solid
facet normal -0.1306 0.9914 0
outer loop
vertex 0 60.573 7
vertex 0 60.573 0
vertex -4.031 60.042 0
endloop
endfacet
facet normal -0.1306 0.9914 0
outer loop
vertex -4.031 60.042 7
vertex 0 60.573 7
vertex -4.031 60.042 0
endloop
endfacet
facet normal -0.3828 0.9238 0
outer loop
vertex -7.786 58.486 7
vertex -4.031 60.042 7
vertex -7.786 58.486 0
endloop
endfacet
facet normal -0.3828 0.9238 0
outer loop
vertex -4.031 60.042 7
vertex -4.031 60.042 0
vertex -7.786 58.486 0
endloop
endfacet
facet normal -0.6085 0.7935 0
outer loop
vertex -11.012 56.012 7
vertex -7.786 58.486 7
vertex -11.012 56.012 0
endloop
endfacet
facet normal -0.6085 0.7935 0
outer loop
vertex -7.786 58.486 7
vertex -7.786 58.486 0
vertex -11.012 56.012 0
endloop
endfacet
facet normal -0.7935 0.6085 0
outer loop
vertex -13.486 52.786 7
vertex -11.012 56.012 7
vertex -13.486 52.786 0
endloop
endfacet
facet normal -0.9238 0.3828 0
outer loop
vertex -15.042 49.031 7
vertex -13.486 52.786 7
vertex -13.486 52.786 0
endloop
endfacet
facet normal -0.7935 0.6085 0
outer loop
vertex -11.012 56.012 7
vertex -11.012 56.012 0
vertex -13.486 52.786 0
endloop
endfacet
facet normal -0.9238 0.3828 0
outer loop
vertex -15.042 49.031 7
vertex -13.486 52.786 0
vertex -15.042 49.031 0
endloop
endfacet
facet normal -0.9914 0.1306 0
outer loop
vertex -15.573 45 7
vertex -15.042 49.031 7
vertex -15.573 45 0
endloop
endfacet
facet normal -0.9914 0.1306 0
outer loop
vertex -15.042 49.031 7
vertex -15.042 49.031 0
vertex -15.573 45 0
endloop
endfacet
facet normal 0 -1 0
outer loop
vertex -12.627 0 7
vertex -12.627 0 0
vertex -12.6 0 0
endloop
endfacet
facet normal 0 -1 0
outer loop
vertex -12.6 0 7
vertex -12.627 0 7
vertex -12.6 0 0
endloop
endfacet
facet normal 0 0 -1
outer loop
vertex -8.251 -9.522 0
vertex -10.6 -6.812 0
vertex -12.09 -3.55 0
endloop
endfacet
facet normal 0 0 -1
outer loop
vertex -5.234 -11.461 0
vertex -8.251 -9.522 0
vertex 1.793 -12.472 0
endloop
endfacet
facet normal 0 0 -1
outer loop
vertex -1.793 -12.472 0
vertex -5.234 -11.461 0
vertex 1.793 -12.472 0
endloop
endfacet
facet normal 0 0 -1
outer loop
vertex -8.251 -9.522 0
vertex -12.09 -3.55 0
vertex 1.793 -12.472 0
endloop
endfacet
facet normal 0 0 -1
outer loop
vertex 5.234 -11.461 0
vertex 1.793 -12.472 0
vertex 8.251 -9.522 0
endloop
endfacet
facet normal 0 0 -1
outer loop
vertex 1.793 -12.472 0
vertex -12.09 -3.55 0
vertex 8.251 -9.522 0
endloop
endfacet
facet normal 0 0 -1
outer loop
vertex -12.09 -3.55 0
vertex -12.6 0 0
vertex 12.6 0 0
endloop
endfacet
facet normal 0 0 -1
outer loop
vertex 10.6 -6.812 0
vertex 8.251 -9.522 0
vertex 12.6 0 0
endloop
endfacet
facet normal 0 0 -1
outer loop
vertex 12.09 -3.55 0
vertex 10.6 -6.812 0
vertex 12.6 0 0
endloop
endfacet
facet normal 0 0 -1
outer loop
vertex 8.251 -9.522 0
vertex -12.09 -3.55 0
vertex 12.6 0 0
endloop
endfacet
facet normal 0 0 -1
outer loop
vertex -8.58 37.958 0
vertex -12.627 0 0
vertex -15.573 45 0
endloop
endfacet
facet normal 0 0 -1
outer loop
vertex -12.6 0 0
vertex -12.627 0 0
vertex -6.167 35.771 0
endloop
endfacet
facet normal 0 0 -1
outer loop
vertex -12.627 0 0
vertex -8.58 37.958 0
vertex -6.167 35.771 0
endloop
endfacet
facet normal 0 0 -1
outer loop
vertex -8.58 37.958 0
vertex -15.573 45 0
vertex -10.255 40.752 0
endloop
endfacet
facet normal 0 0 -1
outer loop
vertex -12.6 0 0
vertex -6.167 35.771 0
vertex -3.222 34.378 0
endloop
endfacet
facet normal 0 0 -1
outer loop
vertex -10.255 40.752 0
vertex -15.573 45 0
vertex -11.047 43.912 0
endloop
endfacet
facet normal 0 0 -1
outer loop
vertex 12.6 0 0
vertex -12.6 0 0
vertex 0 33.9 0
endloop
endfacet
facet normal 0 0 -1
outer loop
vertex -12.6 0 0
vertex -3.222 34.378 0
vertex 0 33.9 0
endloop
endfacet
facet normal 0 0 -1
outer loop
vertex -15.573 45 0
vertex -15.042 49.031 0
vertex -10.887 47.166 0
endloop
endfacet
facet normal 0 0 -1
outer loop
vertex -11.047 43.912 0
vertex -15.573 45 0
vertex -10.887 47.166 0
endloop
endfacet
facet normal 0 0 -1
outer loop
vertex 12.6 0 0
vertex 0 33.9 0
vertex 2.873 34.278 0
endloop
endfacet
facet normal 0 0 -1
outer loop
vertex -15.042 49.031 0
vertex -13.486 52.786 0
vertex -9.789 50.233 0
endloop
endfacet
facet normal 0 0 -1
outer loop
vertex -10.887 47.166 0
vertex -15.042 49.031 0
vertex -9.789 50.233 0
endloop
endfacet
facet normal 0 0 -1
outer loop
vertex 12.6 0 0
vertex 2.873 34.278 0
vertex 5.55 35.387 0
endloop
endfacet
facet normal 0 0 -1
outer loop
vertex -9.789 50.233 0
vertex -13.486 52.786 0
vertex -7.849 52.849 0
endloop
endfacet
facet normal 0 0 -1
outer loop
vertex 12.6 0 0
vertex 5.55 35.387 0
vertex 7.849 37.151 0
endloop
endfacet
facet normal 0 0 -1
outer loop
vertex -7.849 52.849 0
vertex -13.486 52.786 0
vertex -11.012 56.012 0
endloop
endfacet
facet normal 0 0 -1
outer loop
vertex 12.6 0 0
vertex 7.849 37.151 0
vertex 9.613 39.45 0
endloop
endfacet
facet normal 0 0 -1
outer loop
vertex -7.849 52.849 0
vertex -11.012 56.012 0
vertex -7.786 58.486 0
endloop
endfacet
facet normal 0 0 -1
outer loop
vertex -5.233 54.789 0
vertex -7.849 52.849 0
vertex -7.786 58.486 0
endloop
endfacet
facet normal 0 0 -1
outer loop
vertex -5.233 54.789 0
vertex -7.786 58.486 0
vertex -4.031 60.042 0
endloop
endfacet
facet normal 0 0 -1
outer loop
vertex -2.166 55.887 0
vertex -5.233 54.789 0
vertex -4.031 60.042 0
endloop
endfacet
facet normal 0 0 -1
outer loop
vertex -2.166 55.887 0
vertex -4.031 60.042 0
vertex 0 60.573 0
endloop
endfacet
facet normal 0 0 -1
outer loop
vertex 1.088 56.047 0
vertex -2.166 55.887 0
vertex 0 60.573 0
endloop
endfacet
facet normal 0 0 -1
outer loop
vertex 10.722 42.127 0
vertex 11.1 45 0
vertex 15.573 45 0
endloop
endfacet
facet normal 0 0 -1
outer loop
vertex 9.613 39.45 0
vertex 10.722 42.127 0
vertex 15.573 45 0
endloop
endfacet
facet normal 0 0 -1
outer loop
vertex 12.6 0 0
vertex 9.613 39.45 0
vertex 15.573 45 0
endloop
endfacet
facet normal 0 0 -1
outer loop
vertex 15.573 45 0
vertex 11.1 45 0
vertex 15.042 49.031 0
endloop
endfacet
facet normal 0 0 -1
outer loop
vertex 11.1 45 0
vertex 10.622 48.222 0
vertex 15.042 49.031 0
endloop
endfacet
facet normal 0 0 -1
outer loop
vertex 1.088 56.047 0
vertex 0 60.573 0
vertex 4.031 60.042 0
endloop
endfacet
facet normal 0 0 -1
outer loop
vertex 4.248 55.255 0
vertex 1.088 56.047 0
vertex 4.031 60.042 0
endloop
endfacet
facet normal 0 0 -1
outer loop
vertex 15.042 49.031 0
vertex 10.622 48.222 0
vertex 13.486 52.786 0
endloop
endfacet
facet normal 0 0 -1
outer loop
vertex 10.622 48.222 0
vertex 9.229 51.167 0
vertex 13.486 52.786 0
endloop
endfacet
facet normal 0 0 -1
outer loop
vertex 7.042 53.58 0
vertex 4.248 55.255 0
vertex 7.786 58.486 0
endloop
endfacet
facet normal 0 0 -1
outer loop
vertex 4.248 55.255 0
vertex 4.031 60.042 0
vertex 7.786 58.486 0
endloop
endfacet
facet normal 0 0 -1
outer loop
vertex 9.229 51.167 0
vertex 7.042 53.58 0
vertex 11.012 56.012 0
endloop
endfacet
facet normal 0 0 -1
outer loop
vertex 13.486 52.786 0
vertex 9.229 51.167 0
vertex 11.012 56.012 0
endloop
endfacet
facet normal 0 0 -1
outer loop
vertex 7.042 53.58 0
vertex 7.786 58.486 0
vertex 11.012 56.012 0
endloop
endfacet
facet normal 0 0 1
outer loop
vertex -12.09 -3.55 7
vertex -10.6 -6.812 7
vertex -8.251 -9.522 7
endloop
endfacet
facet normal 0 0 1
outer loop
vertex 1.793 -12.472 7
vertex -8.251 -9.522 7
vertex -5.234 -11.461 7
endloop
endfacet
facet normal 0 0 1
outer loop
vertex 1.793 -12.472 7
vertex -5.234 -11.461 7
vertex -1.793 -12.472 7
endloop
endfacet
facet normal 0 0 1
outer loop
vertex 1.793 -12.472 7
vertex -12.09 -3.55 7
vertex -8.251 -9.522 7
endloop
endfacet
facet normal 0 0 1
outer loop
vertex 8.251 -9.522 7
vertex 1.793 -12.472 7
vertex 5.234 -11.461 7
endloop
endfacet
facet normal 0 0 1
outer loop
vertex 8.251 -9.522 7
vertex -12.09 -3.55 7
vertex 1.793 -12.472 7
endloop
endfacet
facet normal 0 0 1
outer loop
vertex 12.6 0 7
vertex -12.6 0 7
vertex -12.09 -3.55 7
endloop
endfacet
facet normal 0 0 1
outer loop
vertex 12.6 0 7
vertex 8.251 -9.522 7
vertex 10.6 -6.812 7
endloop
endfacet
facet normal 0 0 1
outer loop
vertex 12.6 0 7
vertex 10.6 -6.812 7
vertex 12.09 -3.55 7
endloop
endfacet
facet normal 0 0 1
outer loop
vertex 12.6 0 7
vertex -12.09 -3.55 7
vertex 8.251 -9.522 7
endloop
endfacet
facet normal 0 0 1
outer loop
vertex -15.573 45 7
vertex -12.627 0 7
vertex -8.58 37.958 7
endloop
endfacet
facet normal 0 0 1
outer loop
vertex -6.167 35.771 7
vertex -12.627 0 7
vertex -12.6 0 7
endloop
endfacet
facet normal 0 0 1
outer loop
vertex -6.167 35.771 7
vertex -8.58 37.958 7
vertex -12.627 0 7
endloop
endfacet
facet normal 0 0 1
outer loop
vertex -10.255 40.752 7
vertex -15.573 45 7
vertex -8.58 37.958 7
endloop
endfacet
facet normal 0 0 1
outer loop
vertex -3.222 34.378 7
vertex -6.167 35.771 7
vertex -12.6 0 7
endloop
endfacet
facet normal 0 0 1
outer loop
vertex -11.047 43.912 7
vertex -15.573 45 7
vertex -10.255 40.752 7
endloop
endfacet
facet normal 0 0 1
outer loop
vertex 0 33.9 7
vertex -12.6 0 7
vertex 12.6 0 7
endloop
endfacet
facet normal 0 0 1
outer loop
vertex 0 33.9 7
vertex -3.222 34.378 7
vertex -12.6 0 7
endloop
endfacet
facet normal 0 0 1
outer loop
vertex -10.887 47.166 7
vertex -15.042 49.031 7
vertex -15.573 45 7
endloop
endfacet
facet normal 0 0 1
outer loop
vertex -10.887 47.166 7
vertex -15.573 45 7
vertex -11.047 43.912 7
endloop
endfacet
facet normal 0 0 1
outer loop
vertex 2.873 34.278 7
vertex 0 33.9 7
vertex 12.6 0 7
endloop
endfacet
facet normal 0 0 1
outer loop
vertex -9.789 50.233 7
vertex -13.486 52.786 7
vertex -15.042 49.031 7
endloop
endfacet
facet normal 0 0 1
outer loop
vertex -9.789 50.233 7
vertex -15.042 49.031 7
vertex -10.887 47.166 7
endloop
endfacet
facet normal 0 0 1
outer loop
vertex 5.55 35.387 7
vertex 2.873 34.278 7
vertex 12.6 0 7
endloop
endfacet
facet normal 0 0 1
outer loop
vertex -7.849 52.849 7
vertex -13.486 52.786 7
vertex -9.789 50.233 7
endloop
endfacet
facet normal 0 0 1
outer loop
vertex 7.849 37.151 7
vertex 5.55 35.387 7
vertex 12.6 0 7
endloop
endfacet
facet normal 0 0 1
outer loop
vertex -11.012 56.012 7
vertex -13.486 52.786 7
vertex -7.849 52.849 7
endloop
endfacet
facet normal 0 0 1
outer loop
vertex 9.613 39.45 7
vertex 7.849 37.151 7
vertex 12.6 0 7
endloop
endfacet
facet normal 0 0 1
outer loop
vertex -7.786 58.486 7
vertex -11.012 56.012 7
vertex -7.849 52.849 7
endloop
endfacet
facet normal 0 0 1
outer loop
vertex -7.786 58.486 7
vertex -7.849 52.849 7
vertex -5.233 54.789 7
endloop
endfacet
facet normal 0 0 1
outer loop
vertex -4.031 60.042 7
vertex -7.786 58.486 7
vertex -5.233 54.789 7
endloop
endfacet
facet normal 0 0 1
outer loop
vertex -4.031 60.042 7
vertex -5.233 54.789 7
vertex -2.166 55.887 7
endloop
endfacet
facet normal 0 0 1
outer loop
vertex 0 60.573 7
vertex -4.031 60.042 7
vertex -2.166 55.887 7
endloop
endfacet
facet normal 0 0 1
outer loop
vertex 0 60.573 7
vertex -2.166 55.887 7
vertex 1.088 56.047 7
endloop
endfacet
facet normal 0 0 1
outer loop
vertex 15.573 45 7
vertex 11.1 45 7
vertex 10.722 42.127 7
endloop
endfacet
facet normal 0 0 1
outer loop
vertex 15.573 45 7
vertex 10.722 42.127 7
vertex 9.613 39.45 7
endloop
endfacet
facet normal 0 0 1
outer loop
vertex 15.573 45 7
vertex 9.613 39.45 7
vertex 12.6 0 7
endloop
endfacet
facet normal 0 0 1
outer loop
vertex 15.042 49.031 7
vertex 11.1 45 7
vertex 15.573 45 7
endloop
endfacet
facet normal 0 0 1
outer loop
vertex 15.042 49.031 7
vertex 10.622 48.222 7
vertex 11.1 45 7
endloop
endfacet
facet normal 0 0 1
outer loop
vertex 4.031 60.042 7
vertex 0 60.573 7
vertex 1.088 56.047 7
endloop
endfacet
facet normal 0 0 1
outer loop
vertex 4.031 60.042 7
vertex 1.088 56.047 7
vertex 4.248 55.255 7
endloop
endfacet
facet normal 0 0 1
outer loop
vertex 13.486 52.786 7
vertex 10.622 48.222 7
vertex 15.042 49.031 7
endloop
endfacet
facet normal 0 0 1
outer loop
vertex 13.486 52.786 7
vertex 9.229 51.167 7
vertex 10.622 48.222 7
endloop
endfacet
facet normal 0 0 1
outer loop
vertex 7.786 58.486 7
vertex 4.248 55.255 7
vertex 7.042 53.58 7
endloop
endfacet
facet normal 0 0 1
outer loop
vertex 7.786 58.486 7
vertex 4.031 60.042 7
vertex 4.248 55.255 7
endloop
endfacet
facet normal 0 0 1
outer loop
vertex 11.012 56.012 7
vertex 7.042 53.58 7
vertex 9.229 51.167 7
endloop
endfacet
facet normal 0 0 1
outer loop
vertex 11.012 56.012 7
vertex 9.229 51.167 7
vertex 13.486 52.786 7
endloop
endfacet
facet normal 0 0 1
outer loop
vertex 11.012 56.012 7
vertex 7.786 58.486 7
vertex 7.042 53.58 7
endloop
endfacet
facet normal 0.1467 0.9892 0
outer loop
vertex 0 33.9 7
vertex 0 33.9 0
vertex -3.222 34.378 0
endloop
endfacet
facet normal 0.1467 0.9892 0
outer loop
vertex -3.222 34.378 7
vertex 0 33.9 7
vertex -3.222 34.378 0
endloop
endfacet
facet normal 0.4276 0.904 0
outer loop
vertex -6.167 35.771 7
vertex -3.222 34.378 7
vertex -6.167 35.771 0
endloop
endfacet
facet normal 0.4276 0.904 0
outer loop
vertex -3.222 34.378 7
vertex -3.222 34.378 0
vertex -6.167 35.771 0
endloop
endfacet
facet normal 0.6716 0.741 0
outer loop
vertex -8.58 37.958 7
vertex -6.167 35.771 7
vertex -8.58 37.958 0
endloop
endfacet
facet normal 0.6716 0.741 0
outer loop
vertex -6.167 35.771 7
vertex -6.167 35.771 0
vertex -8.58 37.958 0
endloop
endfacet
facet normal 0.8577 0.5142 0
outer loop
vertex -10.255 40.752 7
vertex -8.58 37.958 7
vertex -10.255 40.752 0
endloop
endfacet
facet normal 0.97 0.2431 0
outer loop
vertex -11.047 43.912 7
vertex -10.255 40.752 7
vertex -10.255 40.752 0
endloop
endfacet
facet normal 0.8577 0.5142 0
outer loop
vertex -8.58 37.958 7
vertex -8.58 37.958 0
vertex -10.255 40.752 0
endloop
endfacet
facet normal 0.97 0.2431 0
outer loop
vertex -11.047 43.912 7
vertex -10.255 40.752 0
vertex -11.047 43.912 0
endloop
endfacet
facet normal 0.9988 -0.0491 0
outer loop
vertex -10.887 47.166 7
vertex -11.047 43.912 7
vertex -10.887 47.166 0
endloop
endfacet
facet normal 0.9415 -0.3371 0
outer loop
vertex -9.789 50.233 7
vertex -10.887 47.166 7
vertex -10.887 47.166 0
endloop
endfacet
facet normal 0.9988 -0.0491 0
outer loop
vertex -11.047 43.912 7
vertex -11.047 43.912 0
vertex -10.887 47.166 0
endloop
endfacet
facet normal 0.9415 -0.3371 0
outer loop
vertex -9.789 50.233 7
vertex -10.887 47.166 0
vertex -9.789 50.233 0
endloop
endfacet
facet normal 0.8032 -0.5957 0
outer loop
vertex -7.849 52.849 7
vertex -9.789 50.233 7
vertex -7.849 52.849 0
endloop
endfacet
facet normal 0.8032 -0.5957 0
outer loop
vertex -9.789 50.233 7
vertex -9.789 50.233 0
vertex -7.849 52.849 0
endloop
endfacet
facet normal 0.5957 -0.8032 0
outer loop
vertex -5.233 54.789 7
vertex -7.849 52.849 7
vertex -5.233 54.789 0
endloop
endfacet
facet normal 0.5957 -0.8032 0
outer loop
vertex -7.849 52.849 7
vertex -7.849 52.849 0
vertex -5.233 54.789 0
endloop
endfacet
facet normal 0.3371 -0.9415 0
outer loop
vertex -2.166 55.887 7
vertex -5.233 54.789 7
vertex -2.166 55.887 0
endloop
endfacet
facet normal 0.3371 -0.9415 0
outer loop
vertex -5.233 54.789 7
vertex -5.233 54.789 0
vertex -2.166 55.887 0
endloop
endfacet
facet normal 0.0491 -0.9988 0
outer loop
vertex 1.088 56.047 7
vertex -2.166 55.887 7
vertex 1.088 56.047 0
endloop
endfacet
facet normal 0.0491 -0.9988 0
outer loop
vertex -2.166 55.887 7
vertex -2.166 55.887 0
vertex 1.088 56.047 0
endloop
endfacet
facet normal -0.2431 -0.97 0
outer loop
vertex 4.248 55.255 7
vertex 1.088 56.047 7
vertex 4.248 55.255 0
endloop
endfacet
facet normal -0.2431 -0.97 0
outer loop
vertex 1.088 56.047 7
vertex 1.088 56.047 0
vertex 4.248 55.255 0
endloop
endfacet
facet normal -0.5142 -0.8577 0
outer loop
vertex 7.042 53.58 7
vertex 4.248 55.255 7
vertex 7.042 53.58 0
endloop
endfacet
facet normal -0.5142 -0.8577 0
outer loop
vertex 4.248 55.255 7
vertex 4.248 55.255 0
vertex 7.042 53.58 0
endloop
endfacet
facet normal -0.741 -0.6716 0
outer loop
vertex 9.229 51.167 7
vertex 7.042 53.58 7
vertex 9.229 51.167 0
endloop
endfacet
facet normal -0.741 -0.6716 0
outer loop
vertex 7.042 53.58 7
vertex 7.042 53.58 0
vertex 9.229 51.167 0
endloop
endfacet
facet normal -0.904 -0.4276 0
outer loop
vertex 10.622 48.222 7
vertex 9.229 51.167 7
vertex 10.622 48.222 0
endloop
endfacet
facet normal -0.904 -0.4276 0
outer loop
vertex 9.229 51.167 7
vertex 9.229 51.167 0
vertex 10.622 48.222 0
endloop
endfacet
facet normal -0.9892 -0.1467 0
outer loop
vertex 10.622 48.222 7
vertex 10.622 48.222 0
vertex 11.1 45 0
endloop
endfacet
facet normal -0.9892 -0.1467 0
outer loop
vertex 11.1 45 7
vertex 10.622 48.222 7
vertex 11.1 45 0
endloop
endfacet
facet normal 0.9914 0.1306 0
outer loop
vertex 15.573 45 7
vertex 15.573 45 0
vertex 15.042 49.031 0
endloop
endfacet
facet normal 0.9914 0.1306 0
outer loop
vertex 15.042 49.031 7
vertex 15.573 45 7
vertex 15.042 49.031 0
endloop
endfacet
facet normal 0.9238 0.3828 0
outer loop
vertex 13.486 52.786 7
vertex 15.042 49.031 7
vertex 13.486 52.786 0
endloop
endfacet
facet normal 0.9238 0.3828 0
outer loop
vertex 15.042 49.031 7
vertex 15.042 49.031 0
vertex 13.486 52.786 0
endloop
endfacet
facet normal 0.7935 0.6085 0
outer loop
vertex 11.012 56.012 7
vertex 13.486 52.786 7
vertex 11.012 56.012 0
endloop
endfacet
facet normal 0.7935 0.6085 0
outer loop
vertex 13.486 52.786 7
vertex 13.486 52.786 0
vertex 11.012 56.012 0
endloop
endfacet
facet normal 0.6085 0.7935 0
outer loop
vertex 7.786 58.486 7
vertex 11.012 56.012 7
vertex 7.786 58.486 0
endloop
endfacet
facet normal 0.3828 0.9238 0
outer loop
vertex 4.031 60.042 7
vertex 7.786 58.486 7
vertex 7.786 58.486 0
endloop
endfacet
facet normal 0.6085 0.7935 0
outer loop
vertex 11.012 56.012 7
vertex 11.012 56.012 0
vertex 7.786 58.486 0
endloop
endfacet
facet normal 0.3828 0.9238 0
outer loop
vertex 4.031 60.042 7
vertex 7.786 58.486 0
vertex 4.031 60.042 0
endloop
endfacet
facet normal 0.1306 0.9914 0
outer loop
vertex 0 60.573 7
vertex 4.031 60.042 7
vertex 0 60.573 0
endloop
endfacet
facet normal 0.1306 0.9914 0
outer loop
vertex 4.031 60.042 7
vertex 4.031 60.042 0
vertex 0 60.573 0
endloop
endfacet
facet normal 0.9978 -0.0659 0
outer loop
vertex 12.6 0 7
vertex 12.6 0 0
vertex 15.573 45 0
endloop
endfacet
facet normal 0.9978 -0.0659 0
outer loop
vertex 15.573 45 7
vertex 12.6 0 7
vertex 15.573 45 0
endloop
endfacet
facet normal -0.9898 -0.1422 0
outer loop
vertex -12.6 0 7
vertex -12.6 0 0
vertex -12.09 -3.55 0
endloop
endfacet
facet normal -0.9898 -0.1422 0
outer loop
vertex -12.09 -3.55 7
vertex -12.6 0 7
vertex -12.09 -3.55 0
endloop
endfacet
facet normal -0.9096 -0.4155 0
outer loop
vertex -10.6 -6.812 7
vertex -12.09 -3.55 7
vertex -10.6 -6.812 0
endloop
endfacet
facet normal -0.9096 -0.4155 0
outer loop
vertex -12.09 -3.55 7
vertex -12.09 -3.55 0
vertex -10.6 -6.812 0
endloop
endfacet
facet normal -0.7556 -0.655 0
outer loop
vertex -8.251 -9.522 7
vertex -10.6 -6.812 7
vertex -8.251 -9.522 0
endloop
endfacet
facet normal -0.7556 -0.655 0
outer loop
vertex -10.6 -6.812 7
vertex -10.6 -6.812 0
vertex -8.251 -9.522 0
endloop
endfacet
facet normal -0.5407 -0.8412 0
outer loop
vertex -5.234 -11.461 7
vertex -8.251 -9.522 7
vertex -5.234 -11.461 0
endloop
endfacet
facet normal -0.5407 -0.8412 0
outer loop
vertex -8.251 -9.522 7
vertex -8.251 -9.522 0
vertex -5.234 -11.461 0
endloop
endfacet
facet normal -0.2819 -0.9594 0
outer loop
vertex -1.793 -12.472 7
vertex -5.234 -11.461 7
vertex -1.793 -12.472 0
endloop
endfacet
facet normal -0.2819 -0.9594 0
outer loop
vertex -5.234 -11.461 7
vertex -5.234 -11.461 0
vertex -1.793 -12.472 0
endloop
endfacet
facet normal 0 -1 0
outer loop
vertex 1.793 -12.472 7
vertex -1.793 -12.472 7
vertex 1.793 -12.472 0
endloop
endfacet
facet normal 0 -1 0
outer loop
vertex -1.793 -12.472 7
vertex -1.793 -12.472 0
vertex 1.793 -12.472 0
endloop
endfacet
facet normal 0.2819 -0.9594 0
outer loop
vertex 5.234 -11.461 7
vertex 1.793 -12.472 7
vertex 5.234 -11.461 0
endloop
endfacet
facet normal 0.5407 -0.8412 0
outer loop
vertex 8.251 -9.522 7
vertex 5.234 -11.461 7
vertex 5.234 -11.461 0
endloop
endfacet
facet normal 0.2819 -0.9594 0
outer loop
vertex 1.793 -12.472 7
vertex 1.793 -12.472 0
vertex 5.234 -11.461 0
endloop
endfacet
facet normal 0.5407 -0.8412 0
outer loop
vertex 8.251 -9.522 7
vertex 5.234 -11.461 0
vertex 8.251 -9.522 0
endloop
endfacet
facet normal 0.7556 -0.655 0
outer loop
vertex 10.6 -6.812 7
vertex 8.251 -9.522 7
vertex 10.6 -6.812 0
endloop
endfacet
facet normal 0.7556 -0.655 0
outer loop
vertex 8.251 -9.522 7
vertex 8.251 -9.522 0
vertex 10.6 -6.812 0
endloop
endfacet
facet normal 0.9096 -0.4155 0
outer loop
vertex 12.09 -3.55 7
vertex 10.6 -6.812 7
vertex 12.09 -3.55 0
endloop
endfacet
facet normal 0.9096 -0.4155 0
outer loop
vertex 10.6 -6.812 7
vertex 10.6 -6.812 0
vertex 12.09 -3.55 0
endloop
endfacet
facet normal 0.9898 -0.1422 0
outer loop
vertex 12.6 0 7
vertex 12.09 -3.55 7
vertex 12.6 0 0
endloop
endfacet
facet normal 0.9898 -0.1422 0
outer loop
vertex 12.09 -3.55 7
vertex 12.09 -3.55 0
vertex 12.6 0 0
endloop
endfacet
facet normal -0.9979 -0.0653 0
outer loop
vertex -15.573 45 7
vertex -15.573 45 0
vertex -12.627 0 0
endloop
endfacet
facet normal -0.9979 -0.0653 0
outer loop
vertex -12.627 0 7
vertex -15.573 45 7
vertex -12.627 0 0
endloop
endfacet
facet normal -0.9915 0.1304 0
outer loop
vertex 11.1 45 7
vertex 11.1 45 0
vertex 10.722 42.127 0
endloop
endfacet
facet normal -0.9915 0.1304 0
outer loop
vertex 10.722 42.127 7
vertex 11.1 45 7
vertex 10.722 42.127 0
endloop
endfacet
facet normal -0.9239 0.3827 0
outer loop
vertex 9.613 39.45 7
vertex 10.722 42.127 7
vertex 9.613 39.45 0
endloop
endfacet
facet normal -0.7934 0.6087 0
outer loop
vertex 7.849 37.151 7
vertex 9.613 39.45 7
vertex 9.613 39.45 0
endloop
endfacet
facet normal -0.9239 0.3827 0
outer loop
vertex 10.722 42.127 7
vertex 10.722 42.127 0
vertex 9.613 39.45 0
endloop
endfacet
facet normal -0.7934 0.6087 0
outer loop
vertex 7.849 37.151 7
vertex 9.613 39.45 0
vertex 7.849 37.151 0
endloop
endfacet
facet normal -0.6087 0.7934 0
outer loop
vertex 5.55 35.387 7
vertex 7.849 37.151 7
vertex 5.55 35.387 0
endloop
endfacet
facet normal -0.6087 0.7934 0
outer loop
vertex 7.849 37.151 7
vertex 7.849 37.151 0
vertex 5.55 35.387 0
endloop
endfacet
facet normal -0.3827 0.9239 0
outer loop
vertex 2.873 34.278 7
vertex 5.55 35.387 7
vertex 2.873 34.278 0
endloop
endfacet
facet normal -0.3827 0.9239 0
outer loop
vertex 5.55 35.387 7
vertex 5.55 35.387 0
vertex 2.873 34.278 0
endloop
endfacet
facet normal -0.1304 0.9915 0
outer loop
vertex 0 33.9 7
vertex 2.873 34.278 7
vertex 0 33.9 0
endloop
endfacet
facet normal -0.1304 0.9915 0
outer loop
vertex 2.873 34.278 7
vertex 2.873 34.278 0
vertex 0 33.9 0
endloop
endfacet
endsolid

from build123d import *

# Parameters (mm, degrees)
F1_DEPTH = 7


with BuildPart() as f1:
    # F0 (on Top) → F1 (new body)
    with BuildSketch(Plane.XY):
        with BuildLine():
            Line((0, 0), (12.6, 0))
            ThreePointArc((12.6, 0), (8.909545443, 8.909545443), (0, 12.6))
            Line((0, 12.6), (0, 0))
        make_face()
        with BuildLine():
            ThreePointArc((-12.6, 0), (0, -12.6), (12.6, 0))
            Line((12.6, 0), (0, 0))
            Line((0, 0), (-12.6, 0))
        make_face()
        with BuildLine():
            ThreePointArc((0, 12.6), (8.909545443, 8.909545443), (12.6, 0))
            Line((12.6, 0), (15.5728551745, 45))
            ThreePointArc((15.5728551745, 45), (11.0116714964, 56.0116714964), (0, 60.5728551745))
            ThreePointArc((0, 60.5728551745), (-11.0116714964, 56.0116714964), (-15.5728551745, 45))
            Line((-15.5728551745, 45), (-12.6269701008, 0))
            Line((-12.6269701008, 0), (-12.6, 0))
            ThreePointArc((-12.6, 0), (-8.909545443, 8.909545443), (0, 12.6))
        make_face()
        with BuildLine():
            ThreePointArc((11.1, 45), (7.8488852712, 37.1511147288), (0, 33.9))
            ThreePointArc((0, 33.9), (-7.8488852712, 52.8488852712), (11.1, 45))
        make_face(mode=Mode.SUBTRACT)
        with BuildLine():
            Line((0, 0), (0, 12.6))
            ThreePointArc((0, 12.6), (-8.909545443, 8.909545443), (-12.6, 0))
            Line((-12.6, 0), (0, 0))
        make_face()
    extrude(amount=F1_DEPTH)


solid = f1.part
